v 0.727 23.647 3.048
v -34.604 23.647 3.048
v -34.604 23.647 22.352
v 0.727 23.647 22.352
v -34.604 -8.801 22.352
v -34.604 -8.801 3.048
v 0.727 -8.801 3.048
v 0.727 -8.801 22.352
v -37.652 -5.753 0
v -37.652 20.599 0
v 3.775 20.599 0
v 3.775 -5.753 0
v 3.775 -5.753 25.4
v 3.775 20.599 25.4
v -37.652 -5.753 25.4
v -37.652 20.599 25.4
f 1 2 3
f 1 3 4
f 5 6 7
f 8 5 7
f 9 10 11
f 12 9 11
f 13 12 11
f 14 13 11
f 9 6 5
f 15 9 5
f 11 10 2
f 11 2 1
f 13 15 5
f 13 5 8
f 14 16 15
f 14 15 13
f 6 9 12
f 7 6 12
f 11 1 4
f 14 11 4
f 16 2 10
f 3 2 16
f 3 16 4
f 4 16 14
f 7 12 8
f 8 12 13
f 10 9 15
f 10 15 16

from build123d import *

# Parameters (mm, degrees)
F0_W     = 41.4270346519
F0_H     = 32.4484184384
F1_DEPTH = 25.4
F4_SIZE  = 3.048


# Not quite as in the source:
# - the program builds the solid bodies; features that only make, move or delete a surface that nothing else refers to are left out


with BuildPart() as f1:
    # F0 (on Top) → F1 (new body)
    with BuildSketch(Plane.XY):
        with Locations((-16.9389118673, 7.4230190367)):
            Rectangle(F0_W, F0_H)
    extrude(amount=F1_DEPTH)

    # F4
    f4_edges = [f1.edges().sort_by_distance(p)[0] for p in [
        (3.774605, 23.647228, 12.7),
        (-37.652429, 23.647228, 12.7),
        (-16.938912, 23.647228, 0),
        (-16.938912, 23.647228, 25.4),
        (-37.652429, -8.80119, 12.7),
        (3.774605, -8.80119, 12.7),
        (-16.938912, -8.80119, 0),
        (-16.938912, -8.80119, 25.4),
    ]]
    chamfer(f4_edges, length=F4_SIZE)


solid = f1.part
